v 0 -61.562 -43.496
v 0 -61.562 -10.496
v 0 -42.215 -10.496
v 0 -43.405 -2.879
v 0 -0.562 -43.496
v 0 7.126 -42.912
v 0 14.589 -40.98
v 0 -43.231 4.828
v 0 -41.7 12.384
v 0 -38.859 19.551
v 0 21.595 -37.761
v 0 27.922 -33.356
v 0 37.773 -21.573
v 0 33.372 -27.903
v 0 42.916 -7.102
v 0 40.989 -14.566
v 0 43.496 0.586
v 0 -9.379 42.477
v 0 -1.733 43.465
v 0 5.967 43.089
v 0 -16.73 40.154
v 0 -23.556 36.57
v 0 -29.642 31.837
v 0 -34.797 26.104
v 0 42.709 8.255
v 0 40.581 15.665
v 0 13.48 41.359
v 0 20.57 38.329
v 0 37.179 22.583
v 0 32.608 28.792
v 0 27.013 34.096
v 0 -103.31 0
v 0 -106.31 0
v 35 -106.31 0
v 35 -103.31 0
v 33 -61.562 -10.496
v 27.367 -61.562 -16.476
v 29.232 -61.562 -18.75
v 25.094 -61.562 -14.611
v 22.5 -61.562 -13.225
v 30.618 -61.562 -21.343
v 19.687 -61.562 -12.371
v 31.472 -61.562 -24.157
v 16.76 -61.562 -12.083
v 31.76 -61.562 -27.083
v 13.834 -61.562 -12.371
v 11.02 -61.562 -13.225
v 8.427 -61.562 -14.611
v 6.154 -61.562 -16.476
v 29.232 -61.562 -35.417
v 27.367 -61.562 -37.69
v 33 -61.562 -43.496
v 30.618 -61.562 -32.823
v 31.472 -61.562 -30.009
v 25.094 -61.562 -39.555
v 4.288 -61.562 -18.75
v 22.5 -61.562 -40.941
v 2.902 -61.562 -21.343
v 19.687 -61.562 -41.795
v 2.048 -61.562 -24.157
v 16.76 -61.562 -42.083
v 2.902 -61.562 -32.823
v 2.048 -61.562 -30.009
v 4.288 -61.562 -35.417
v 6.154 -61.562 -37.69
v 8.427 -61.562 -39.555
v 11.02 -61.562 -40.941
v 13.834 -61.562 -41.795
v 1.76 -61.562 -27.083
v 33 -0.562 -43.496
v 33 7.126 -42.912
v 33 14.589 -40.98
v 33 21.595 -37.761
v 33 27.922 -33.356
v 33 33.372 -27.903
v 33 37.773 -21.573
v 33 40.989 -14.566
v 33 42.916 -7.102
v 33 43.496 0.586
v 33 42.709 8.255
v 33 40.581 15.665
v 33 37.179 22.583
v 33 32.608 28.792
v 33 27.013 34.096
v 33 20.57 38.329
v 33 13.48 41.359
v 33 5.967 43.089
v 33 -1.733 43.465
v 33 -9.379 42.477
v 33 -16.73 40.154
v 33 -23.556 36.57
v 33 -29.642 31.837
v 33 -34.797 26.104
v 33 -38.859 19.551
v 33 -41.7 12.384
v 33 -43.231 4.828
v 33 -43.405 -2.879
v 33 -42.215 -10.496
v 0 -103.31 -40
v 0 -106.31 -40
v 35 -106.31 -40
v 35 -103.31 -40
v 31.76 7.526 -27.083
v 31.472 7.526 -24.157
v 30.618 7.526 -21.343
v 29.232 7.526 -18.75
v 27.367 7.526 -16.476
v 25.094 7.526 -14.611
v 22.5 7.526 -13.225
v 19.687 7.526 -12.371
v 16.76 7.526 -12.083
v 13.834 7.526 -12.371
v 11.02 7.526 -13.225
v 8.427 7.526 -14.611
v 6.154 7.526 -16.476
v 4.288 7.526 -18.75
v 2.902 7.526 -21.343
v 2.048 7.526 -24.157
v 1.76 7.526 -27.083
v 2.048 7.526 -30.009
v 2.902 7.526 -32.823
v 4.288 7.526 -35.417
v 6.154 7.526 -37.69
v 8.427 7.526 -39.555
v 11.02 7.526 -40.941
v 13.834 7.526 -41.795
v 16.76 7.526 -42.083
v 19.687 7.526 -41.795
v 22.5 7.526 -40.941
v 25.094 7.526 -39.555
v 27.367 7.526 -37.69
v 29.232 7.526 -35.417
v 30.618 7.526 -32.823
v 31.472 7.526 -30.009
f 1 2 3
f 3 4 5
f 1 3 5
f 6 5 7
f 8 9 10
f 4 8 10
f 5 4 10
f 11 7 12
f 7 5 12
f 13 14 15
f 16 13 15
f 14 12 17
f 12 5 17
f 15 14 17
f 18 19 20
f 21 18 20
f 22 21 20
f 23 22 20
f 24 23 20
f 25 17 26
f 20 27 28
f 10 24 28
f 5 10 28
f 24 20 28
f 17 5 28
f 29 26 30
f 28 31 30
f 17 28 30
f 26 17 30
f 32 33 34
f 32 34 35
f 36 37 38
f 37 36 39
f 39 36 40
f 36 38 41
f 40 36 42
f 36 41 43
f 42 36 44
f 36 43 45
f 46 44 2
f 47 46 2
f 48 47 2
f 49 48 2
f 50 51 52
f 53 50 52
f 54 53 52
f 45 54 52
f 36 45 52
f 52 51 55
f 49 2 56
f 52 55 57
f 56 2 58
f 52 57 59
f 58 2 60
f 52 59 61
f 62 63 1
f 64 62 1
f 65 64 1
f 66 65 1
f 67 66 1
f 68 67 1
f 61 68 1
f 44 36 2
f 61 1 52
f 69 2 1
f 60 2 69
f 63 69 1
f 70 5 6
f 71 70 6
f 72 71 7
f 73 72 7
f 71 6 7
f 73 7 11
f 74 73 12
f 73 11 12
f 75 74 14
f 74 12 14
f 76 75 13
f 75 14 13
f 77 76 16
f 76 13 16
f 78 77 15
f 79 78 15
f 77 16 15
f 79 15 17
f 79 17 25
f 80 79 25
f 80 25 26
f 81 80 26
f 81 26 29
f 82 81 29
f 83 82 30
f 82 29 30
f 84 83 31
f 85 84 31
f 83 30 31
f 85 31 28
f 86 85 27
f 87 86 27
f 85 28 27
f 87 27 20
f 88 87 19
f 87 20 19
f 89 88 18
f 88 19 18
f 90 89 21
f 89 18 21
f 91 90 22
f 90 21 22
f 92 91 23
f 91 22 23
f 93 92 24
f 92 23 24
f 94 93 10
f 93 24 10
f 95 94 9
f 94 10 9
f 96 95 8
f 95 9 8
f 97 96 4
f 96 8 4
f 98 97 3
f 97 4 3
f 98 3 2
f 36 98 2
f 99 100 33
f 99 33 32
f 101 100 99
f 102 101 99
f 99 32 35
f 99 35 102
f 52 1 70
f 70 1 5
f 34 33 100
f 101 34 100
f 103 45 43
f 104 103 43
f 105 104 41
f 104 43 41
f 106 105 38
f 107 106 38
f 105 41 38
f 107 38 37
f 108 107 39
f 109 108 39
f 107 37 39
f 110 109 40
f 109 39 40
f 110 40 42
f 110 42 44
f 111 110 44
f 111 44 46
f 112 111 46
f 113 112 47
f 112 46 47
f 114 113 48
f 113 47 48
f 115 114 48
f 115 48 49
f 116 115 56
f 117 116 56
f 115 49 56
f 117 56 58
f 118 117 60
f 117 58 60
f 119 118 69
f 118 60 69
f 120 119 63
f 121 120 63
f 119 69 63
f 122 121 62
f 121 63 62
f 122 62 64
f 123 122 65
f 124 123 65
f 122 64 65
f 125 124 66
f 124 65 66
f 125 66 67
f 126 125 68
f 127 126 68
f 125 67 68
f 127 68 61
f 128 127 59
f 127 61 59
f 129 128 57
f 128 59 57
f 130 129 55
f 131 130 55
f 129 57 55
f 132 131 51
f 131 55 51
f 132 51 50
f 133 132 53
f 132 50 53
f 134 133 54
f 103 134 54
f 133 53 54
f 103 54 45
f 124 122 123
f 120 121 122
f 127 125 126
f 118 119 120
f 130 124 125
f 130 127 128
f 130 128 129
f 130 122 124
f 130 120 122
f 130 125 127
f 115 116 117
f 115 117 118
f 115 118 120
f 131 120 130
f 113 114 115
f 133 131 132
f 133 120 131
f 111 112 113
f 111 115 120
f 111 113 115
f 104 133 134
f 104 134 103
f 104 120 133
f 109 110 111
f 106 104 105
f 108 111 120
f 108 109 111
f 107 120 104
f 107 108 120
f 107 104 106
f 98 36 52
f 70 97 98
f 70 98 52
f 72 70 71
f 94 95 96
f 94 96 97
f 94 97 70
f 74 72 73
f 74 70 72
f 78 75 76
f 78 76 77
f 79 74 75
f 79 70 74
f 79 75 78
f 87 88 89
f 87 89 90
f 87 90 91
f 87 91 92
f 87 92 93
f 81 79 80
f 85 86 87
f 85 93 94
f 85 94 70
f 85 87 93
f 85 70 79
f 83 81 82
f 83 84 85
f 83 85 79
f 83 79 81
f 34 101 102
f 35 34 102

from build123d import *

# Parameters (mm, degrees)
F1_DEPTH = 33
F2_R     = 15
F3_DEPTH = 69.088
F4_W     = 3
F4_H     = 20
F5_DEPTH = 35


with BuildPart() as f1:
    # F0 (on Right) → F1 (new body)
    with BuildSketch(Plane.YZ):
        with BuildLine():
            Line((-0.5615277552, -10.4963755568), (-0.5615277552, -43.4963755568))
            ThreePointArc((-0.5615277552, -43.4963755568), (30.5599700806, -30.9570384351), (43.5, 0))
            ThreePointArc((43.5, 0), (-5.2873916524, 43.1774650659), (-42.2146431961, -10.4963755568))
            Line((-42.2146431961, -10.4963755568), (-0.5615277552, -10.4963755568))
        make_face()
        with BuildLine():
            Line((-61.5615277552, -43.4963755568), (-0.5615277552, -43.4963755568))
            ThreePointArc((-0.5615277552, -43.4963755568), (-27.0129635603, -34.0961845327), (-42.2146431961, -10.4963755568))
            Line((-42.2146431961, -10.4963755568), (-61.5615277552, -10.4963755568))
            Line((-61.5615277552, -10.4963755568), (-61.5615277552, -43.4963755568))
        make_face()
        with BuildLine():
            ThreePointArc((-42.2146431961, -10.4963755568), (-27.0129635603, -34.0961845327), (-0.5615277552, -43.4963755568))
            Line((-0.5615277552, -43.4963755568), (-0.5615277552, -10.4963755568))
            Line((-0.5615277552, -10.4963755568), (-42.2146431961, -10.4963755568))
        make_face()
    extrude(amount=F1_DEPTH)

    # F2 (on face) → F3 (cut)
    with BuildSketch(Plane.XZ.offset(61.5615277552)):
        with Locations((16.7601518333, -27.0830877125)):
            Circle(F2_R)
    extrude(amount=-F3_DEPTH, mode=Mode.SUBTRACT)


with BuildPart() as f5:
    # F4 (on Right) → F5 (new body)
    with BuildSketch(Plane.YZ):
        with Locations((-104.8103831157, -10)):
            Rectangle(F4_W, F4_H)
    extrude(amount=F5_DEPTH)

    # F6: F5 across face


with BuildPart() as f5_1:
    add(f5.part)
    add(f5.part.mirror(Plane(origin=(17.5, -104.8103831157, -20), x_dir=(1, 0, 0), z_dir=(0, 0, -1))))


solid = Compound([f1.part, f5_1.part])
